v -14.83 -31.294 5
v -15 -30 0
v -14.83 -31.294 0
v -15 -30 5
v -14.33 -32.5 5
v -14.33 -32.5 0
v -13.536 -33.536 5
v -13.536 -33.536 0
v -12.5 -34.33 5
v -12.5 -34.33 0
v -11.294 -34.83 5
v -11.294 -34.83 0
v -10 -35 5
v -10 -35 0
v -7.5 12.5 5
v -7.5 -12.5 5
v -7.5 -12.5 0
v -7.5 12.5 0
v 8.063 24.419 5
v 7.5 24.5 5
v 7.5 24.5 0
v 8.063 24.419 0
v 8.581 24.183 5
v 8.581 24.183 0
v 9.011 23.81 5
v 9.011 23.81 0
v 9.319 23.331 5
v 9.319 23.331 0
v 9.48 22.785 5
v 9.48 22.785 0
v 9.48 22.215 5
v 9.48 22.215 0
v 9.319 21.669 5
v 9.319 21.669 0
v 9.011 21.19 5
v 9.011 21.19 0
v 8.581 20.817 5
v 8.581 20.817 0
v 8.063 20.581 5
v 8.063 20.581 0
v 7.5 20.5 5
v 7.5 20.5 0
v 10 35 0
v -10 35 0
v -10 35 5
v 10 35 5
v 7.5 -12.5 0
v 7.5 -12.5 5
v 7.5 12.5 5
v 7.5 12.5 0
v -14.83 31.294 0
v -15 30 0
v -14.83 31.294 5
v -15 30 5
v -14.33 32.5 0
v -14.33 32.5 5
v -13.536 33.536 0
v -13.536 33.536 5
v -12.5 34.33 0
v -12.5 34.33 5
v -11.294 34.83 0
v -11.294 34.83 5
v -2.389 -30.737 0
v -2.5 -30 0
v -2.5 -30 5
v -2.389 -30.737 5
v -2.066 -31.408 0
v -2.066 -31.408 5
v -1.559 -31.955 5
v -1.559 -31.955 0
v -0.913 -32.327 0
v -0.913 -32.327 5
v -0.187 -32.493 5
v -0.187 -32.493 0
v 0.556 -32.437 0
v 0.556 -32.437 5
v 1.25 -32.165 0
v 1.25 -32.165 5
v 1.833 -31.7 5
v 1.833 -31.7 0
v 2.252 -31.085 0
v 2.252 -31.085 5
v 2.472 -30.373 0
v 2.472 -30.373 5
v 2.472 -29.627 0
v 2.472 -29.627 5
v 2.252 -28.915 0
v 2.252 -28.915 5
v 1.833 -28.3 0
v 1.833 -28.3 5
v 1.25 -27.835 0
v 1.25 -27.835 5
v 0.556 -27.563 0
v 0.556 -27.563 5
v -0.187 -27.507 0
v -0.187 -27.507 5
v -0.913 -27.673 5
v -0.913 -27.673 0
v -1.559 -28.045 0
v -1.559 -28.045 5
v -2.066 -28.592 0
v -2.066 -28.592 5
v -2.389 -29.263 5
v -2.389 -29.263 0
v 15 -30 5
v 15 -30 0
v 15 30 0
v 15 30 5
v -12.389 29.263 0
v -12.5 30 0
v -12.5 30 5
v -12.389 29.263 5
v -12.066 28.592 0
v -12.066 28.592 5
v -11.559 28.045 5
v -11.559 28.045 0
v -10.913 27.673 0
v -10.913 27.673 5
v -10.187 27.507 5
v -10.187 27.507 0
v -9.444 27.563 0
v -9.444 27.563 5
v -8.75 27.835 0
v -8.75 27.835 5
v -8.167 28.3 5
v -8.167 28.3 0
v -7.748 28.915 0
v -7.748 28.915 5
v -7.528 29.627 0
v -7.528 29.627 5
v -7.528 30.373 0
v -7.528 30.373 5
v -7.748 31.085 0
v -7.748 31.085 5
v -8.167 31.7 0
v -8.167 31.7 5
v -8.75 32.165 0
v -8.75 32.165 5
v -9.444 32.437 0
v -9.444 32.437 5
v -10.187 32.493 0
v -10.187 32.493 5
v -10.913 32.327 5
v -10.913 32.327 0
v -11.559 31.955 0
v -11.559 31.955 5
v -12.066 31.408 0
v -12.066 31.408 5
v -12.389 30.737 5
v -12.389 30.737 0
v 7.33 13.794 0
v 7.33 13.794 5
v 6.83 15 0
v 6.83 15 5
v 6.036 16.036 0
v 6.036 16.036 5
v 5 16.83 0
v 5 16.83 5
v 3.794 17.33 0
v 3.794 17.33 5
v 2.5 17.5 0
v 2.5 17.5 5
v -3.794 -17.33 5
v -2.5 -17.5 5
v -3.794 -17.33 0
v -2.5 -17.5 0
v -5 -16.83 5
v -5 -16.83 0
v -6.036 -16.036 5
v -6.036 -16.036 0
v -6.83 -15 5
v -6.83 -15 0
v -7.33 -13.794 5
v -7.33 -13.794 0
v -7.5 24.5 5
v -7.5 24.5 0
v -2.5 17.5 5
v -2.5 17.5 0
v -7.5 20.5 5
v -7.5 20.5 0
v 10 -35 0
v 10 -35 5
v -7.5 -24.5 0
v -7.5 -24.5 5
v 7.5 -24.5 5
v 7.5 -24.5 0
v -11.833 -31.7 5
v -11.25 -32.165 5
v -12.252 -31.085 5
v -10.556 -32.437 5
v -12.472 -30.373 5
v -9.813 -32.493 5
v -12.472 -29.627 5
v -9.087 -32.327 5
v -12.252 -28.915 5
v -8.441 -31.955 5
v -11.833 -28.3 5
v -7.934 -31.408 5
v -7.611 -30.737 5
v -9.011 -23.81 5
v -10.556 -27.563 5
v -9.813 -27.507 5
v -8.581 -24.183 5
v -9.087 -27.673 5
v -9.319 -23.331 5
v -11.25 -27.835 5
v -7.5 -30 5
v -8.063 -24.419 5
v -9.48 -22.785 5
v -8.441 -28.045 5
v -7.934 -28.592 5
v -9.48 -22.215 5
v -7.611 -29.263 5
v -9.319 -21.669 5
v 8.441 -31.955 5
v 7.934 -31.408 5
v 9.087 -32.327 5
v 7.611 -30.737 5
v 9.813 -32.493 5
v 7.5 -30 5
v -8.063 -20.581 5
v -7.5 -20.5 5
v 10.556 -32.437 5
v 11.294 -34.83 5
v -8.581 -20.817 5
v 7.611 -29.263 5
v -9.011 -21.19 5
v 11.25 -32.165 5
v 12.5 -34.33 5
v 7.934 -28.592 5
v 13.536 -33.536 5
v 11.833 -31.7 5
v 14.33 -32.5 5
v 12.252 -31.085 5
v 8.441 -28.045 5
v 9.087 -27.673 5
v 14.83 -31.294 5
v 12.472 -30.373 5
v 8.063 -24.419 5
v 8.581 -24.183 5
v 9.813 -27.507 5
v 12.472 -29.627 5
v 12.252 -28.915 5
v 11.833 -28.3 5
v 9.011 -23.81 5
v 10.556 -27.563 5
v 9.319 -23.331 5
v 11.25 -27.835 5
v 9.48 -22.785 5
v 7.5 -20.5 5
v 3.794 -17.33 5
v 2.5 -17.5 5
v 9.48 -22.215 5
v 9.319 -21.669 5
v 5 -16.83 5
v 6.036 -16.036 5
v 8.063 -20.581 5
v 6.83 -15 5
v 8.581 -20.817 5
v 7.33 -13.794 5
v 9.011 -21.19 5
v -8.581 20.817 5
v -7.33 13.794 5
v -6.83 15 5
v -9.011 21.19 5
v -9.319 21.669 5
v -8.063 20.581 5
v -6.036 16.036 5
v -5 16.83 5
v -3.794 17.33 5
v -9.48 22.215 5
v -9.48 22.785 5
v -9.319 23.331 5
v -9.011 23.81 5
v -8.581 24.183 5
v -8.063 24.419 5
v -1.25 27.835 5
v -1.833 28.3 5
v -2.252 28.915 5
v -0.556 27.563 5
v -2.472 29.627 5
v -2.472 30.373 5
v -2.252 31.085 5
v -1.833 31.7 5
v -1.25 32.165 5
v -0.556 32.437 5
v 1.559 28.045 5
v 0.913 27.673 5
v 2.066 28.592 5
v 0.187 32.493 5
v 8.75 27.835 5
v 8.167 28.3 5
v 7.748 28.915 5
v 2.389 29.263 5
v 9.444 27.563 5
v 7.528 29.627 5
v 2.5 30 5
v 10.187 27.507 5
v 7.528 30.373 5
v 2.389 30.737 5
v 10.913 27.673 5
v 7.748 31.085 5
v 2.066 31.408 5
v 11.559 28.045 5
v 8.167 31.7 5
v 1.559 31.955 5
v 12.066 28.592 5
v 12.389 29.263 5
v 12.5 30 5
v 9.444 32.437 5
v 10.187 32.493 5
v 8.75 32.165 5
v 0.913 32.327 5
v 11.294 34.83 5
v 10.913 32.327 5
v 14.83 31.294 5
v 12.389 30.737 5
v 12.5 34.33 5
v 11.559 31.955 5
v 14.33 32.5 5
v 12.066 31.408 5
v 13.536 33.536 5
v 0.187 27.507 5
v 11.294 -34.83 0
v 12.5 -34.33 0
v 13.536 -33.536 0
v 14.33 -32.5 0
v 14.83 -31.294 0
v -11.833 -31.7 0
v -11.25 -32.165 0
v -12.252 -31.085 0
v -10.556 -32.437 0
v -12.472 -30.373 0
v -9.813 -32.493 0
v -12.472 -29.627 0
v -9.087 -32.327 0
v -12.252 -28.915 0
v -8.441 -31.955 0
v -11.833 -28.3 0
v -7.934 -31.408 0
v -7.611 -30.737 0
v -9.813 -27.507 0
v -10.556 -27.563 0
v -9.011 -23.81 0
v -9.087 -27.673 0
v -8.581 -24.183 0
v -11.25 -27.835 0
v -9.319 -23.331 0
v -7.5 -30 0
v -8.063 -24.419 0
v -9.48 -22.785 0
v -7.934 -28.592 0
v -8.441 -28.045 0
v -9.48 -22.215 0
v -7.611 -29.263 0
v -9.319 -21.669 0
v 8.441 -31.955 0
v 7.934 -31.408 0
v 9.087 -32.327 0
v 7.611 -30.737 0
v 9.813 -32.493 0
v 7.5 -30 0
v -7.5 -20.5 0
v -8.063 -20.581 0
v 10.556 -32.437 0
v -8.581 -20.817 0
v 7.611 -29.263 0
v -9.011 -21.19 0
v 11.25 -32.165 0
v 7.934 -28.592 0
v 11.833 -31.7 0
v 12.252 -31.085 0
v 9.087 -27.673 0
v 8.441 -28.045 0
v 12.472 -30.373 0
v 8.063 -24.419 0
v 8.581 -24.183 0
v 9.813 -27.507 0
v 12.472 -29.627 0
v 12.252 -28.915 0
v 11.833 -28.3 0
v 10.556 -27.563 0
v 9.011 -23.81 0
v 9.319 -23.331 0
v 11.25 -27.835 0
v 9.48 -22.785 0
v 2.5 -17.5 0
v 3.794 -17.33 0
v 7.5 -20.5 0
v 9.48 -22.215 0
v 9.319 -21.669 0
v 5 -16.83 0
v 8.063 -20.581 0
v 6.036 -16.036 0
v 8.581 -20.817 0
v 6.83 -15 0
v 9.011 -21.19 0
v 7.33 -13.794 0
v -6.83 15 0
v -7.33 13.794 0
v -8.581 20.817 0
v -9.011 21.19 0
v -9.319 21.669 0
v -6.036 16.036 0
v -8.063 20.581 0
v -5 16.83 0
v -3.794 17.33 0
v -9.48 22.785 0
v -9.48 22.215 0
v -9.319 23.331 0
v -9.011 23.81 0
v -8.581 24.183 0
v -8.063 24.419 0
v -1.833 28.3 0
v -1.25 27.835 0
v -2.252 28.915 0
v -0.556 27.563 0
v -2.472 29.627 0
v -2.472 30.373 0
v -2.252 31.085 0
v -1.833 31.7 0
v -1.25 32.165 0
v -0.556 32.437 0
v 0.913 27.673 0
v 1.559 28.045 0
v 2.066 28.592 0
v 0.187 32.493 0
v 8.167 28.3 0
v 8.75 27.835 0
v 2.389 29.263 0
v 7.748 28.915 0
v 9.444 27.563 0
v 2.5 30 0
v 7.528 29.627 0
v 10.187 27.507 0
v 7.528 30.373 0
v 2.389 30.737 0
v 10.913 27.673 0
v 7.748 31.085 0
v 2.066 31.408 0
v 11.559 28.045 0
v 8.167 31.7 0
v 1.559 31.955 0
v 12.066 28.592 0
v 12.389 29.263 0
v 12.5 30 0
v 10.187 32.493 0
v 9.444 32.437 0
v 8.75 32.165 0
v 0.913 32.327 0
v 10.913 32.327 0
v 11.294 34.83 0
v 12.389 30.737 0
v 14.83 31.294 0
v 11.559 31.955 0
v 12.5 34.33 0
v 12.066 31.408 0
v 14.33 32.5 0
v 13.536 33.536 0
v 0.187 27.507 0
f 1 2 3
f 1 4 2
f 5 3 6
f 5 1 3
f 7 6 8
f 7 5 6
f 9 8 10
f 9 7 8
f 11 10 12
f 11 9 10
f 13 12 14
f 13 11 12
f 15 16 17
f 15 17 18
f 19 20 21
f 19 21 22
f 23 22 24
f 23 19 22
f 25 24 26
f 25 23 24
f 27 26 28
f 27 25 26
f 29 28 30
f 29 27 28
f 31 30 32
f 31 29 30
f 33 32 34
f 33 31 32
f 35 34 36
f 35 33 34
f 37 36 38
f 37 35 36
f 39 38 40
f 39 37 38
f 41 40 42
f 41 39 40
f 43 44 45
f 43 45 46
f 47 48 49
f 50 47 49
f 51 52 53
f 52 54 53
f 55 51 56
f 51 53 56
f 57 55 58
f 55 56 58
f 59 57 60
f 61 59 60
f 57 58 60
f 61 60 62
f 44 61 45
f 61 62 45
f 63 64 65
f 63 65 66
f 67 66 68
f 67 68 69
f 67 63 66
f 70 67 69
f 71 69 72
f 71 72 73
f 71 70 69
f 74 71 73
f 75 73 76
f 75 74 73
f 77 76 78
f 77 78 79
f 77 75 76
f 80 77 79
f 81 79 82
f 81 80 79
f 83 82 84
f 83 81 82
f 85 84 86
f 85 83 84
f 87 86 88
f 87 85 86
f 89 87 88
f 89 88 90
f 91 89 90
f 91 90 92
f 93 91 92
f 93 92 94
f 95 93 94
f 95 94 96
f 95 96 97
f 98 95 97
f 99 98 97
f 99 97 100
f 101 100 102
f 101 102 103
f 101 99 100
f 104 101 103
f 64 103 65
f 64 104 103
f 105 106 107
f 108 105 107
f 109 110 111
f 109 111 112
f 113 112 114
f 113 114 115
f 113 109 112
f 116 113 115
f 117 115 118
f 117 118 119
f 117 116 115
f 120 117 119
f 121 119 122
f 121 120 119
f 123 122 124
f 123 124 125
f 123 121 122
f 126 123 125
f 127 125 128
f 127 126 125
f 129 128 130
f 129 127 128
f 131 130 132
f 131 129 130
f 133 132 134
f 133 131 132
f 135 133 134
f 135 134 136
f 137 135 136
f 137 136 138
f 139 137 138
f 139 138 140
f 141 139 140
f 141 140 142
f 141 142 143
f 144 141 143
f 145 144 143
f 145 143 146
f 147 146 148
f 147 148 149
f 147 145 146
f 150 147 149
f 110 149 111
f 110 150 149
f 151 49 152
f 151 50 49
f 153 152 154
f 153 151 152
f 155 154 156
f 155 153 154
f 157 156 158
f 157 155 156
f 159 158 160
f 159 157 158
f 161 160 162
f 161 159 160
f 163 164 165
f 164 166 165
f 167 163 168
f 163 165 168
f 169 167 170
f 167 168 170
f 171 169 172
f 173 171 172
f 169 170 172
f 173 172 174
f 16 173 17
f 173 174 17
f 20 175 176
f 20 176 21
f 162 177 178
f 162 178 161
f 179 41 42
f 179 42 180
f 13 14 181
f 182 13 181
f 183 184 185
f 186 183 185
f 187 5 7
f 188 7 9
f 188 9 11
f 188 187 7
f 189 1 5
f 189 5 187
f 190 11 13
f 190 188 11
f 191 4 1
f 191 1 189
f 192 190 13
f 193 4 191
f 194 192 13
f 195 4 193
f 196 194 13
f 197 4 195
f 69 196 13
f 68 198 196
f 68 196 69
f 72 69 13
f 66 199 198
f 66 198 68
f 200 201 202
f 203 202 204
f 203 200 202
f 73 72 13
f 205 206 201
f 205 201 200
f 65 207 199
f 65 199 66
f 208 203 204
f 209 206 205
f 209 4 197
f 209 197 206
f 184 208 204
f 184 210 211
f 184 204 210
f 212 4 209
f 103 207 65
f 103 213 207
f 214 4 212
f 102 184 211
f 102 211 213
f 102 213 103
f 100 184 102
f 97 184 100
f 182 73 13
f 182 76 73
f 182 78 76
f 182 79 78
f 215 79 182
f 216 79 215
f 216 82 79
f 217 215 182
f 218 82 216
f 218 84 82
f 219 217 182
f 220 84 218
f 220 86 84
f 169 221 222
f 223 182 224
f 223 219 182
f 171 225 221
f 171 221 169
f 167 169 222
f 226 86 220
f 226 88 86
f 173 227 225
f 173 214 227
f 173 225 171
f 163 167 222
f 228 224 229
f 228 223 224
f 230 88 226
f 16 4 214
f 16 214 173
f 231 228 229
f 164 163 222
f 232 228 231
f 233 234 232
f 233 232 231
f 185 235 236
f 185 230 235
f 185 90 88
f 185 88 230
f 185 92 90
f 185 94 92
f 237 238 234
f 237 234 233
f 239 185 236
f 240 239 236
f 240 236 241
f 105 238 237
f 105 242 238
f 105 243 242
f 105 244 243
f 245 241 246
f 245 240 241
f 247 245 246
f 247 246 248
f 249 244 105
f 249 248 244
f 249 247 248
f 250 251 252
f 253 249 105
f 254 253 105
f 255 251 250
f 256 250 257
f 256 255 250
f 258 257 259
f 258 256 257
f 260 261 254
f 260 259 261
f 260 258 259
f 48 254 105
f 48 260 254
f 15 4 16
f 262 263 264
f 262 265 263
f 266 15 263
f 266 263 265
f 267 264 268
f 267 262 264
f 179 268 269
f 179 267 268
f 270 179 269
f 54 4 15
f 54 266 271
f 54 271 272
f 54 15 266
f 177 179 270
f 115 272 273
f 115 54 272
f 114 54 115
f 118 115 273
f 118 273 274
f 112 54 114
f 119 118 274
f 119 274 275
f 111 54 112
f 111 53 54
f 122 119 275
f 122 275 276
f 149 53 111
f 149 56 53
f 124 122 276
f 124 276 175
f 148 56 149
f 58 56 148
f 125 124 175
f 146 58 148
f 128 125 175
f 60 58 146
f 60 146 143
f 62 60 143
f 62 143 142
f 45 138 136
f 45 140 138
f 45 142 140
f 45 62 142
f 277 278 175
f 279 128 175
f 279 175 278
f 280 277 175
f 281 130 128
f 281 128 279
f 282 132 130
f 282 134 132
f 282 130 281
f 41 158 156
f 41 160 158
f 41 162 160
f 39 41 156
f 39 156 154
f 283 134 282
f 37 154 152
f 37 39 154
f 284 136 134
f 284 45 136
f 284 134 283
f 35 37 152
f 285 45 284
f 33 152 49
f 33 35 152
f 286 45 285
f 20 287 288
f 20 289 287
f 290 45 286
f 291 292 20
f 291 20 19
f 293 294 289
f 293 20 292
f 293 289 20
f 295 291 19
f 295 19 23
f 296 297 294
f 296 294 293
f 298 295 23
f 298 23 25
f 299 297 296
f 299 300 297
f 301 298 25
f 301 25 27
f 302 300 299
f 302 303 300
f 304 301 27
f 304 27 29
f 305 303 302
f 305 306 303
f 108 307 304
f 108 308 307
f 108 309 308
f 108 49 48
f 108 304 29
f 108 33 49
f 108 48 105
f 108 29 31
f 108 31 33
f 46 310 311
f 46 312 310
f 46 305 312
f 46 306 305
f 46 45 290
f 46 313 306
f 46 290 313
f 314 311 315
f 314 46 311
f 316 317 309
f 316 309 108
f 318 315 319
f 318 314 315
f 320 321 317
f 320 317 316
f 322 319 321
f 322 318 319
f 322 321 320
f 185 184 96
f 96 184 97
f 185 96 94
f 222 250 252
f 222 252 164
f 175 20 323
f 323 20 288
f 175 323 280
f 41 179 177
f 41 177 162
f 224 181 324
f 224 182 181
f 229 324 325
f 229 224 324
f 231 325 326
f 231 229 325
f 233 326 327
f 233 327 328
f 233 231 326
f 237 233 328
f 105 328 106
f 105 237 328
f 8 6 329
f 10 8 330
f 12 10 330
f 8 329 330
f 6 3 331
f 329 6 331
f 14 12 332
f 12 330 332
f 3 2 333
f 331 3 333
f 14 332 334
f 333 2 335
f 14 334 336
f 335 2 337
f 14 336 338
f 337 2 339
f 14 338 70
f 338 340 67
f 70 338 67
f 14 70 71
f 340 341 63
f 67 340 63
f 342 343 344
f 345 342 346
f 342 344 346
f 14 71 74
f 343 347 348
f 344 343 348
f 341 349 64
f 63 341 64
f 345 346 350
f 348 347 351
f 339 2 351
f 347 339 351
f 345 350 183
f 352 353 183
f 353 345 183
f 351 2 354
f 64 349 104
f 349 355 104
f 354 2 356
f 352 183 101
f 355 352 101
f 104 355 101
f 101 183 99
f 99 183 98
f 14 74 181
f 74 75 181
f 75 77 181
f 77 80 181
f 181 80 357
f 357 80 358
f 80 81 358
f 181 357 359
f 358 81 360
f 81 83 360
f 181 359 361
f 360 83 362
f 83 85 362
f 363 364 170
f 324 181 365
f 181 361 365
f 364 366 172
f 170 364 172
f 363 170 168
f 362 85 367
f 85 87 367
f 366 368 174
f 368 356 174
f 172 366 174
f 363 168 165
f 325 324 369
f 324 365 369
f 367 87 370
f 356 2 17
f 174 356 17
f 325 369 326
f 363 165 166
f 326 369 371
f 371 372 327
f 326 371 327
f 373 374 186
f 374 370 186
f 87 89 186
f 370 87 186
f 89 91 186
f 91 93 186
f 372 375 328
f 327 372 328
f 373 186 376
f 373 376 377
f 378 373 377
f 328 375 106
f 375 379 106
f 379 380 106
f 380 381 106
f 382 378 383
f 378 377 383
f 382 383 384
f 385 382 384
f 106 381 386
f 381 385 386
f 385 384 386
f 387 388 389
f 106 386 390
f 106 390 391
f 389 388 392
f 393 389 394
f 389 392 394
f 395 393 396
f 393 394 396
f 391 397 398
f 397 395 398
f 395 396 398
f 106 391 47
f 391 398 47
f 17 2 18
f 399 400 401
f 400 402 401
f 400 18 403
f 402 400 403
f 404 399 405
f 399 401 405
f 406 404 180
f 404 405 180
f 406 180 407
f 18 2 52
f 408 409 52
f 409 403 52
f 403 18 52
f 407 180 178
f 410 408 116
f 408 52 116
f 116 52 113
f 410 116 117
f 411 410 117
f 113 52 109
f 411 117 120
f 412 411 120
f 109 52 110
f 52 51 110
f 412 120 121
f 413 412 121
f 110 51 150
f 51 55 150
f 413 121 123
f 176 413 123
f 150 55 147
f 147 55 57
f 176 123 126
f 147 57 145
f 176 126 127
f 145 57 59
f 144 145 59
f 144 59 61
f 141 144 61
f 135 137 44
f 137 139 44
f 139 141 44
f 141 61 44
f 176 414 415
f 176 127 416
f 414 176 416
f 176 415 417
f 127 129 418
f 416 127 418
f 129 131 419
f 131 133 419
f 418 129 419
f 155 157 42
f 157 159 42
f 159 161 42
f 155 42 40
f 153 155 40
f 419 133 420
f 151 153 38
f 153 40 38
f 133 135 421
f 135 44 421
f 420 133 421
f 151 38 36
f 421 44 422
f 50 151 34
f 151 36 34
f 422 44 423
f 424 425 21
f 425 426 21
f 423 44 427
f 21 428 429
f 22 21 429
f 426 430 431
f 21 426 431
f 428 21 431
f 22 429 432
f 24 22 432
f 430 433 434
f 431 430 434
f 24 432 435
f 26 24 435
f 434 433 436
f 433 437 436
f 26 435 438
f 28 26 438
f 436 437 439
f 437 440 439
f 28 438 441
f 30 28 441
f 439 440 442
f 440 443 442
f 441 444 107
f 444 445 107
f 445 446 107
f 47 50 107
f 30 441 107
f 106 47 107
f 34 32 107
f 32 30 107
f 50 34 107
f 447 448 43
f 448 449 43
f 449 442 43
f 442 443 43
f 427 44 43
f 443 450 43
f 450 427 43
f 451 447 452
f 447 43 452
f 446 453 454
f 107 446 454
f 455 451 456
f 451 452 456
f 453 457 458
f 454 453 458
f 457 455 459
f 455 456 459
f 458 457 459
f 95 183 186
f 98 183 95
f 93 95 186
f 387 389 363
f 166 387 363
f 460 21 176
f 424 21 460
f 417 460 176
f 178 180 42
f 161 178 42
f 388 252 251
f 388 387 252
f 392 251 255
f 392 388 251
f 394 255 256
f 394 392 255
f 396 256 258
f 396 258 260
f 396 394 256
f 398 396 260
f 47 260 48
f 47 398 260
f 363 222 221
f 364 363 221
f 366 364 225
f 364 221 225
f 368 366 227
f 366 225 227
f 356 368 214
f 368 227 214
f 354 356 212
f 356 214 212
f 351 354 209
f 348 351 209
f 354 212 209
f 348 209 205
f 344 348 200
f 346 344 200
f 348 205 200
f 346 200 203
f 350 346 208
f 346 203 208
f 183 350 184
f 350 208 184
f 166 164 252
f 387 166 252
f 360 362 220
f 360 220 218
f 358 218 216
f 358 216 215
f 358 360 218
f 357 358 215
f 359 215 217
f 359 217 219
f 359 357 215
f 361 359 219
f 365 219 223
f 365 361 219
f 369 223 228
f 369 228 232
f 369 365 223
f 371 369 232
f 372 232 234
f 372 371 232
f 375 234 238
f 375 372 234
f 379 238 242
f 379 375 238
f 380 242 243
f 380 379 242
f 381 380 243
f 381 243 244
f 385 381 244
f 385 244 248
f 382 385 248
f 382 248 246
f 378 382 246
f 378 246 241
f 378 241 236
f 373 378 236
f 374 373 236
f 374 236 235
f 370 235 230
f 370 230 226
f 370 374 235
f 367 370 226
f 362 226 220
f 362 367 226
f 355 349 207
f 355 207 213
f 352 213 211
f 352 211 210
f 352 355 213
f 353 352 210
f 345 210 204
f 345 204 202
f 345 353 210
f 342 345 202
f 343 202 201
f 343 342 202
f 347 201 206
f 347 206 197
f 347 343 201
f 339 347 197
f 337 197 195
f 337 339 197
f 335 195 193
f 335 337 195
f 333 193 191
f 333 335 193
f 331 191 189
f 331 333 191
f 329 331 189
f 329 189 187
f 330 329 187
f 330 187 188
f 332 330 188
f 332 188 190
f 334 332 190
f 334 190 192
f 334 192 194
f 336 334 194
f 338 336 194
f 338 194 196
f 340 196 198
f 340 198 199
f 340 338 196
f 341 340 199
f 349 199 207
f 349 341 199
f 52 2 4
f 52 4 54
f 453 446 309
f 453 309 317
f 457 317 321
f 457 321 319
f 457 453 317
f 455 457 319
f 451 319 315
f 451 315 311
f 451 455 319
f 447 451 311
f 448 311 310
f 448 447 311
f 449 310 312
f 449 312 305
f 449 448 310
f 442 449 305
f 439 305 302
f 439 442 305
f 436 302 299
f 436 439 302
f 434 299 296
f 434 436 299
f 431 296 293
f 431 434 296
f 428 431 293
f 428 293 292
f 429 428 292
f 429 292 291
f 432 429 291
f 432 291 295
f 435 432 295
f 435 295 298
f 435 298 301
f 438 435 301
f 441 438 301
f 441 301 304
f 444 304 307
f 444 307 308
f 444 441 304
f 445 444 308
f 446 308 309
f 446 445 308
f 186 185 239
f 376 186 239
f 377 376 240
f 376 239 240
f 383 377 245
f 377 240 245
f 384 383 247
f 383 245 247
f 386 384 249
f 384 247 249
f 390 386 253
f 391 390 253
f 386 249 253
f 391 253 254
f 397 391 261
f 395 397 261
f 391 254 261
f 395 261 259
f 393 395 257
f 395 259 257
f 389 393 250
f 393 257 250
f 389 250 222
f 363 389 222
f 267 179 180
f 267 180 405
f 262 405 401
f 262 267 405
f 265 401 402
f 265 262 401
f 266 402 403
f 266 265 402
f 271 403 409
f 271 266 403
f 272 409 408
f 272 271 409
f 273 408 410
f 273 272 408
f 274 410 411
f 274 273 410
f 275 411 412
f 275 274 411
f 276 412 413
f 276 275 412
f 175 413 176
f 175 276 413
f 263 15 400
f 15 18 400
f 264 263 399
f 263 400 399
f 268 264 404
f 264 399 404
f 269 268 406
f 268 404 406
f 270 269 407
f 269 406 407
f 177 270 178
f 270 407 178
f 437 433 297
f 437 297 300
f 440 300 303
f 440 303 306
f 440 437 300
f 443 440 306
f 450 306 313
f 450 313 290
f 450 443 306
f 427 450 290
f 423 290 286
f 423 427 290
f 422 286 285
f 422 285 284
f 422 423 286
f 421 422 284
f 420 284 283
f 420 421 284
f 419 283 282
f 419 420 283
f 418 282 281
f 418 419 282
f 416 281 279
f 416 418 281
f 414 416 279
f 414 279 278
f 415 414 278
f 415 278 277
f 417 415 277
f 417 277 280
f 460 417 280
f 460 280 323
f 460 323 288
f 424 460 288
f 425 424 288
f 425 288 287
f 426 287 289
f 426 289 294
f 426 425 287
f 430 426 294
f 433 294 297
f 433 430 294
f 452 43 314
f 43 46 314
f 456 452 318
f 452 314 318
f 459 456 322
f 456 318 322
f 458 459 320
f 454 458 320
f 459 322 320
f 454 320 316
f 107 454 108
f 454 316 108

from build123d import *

# Parameters (mm, degrees)
SKETCH1_W           = 30
SKETCH1_H           = 70
SKETCH1_R           = 2.5
BOSS_EXTRUDE1_DEPTH = 5
FILLET1_R           = 5
SKETCH2_W           = 15
SKETCH2_H           = 35
CUT_EXTRUDE1_DEPTH  = 39.405728739
CUT_EXTRUDE2_DEPTH  = 39.405728739
FILLET2_R           = 5


with BuildPart() as part:
    # Sketch1 → Boss-Extrude1 (new body)
    with BuildSketch(Plane.XY):
        Rectangle(SKETCH1_W, SKETCH1_H)
        with Locations((0, 30)):
            Circle(SKETCH1_R, mode=Mode.SUBTRACT)
        with Locations((10, 30)):
            Circle(SKETCH1_R, mode=Mode.SUBTRACT)
        with Locations(Location((-10, 30, 0), (0, 0, 180))):
            Circle(SKETCH1_R, mode=Mode.SUBTRACT)
        with Locations(Location((10, -30, 0), (0, 0, 180))):
            Circle(SKETCH1_R, mode=Mode.SUBTRACT)
        with Locations(Location((0, -30, 0), (0, 0, 180))):
            Circle(SKETCH1_R, mode=Mode.SUBTRACT)
        with Locations((-10, -30)):
            Circle(SKETCH1_R, mode=Mode.SUBTRACT)
    extrude(amount=BOSS_EXTRUDE1_DEPTH)

    # Fillet1
    fillet1_edges = [part.edges().sort_by_distance(p)[0] for p in [
        (15, -35, 2.5),
        (-15, -35, 2.5),
        (-15, 35, 2.5),
        (15, 35, 2.5),
    ]]
    fillet(fillet1_edges, radius=FILLET1_R)

    # Sketch2 → Cut-Extrude1 (cut, through all)
    with BuildSketch(Plane.XY.offset(5)):
        Rectangle(SKETCH2_W, SKETCH2_H)
    extrude(amount=-CUT_EXTRUDE1_DEPTH, mode=Mode.SUBTRACT)

    # Sketch3 → Cut-Extrude2 (cut, through all)
    with BuildSketch(Plane.XY.offset(5)):
        with BuildLine():
            Line((-7.5, 24.5), (7.5, 24.5))
            ThreePointArc((7.5, 24.5), (9.5, 22.5), (7.5, 20.5))
            Line((7.5, 20.5), (-7.5, 20.5))
            ThreePointArc((-7.5, 20.5), (-9.5, 22.5), (-7.5, 24.5))
        make_face()
        with BuildLine():
            Line((-7.5, -24.5), (7.5, -24.5))
            ThreePointArc((7.5, -24.5), (9.5, -22.5), (7.5, -20.5))
            Line((7.5, -20.5), (-7.5, -20.5))
            ThreePointArc((-7.5, -20.5), (-9.5, -22.5), (-7.5, -24.5))
        make_face()
    extrude(amount=-CUT_EXTRUDE2_DEPTH, mode=Mode.SUBTRACT)

    # Fillet2
    fillet2_edges = [part.edges().sort_by_distance(p)[0] for p in [
        (7.5, 17.5, 2.5),
        (7.5, -17.5, 2.5),
        (-7.5, -17.5, 2.5),
        (-7.5, 17.5, 2.5),
    ]]
    fillet(fillet2_edges, radius=FILLET2_R)


solid = part.part
